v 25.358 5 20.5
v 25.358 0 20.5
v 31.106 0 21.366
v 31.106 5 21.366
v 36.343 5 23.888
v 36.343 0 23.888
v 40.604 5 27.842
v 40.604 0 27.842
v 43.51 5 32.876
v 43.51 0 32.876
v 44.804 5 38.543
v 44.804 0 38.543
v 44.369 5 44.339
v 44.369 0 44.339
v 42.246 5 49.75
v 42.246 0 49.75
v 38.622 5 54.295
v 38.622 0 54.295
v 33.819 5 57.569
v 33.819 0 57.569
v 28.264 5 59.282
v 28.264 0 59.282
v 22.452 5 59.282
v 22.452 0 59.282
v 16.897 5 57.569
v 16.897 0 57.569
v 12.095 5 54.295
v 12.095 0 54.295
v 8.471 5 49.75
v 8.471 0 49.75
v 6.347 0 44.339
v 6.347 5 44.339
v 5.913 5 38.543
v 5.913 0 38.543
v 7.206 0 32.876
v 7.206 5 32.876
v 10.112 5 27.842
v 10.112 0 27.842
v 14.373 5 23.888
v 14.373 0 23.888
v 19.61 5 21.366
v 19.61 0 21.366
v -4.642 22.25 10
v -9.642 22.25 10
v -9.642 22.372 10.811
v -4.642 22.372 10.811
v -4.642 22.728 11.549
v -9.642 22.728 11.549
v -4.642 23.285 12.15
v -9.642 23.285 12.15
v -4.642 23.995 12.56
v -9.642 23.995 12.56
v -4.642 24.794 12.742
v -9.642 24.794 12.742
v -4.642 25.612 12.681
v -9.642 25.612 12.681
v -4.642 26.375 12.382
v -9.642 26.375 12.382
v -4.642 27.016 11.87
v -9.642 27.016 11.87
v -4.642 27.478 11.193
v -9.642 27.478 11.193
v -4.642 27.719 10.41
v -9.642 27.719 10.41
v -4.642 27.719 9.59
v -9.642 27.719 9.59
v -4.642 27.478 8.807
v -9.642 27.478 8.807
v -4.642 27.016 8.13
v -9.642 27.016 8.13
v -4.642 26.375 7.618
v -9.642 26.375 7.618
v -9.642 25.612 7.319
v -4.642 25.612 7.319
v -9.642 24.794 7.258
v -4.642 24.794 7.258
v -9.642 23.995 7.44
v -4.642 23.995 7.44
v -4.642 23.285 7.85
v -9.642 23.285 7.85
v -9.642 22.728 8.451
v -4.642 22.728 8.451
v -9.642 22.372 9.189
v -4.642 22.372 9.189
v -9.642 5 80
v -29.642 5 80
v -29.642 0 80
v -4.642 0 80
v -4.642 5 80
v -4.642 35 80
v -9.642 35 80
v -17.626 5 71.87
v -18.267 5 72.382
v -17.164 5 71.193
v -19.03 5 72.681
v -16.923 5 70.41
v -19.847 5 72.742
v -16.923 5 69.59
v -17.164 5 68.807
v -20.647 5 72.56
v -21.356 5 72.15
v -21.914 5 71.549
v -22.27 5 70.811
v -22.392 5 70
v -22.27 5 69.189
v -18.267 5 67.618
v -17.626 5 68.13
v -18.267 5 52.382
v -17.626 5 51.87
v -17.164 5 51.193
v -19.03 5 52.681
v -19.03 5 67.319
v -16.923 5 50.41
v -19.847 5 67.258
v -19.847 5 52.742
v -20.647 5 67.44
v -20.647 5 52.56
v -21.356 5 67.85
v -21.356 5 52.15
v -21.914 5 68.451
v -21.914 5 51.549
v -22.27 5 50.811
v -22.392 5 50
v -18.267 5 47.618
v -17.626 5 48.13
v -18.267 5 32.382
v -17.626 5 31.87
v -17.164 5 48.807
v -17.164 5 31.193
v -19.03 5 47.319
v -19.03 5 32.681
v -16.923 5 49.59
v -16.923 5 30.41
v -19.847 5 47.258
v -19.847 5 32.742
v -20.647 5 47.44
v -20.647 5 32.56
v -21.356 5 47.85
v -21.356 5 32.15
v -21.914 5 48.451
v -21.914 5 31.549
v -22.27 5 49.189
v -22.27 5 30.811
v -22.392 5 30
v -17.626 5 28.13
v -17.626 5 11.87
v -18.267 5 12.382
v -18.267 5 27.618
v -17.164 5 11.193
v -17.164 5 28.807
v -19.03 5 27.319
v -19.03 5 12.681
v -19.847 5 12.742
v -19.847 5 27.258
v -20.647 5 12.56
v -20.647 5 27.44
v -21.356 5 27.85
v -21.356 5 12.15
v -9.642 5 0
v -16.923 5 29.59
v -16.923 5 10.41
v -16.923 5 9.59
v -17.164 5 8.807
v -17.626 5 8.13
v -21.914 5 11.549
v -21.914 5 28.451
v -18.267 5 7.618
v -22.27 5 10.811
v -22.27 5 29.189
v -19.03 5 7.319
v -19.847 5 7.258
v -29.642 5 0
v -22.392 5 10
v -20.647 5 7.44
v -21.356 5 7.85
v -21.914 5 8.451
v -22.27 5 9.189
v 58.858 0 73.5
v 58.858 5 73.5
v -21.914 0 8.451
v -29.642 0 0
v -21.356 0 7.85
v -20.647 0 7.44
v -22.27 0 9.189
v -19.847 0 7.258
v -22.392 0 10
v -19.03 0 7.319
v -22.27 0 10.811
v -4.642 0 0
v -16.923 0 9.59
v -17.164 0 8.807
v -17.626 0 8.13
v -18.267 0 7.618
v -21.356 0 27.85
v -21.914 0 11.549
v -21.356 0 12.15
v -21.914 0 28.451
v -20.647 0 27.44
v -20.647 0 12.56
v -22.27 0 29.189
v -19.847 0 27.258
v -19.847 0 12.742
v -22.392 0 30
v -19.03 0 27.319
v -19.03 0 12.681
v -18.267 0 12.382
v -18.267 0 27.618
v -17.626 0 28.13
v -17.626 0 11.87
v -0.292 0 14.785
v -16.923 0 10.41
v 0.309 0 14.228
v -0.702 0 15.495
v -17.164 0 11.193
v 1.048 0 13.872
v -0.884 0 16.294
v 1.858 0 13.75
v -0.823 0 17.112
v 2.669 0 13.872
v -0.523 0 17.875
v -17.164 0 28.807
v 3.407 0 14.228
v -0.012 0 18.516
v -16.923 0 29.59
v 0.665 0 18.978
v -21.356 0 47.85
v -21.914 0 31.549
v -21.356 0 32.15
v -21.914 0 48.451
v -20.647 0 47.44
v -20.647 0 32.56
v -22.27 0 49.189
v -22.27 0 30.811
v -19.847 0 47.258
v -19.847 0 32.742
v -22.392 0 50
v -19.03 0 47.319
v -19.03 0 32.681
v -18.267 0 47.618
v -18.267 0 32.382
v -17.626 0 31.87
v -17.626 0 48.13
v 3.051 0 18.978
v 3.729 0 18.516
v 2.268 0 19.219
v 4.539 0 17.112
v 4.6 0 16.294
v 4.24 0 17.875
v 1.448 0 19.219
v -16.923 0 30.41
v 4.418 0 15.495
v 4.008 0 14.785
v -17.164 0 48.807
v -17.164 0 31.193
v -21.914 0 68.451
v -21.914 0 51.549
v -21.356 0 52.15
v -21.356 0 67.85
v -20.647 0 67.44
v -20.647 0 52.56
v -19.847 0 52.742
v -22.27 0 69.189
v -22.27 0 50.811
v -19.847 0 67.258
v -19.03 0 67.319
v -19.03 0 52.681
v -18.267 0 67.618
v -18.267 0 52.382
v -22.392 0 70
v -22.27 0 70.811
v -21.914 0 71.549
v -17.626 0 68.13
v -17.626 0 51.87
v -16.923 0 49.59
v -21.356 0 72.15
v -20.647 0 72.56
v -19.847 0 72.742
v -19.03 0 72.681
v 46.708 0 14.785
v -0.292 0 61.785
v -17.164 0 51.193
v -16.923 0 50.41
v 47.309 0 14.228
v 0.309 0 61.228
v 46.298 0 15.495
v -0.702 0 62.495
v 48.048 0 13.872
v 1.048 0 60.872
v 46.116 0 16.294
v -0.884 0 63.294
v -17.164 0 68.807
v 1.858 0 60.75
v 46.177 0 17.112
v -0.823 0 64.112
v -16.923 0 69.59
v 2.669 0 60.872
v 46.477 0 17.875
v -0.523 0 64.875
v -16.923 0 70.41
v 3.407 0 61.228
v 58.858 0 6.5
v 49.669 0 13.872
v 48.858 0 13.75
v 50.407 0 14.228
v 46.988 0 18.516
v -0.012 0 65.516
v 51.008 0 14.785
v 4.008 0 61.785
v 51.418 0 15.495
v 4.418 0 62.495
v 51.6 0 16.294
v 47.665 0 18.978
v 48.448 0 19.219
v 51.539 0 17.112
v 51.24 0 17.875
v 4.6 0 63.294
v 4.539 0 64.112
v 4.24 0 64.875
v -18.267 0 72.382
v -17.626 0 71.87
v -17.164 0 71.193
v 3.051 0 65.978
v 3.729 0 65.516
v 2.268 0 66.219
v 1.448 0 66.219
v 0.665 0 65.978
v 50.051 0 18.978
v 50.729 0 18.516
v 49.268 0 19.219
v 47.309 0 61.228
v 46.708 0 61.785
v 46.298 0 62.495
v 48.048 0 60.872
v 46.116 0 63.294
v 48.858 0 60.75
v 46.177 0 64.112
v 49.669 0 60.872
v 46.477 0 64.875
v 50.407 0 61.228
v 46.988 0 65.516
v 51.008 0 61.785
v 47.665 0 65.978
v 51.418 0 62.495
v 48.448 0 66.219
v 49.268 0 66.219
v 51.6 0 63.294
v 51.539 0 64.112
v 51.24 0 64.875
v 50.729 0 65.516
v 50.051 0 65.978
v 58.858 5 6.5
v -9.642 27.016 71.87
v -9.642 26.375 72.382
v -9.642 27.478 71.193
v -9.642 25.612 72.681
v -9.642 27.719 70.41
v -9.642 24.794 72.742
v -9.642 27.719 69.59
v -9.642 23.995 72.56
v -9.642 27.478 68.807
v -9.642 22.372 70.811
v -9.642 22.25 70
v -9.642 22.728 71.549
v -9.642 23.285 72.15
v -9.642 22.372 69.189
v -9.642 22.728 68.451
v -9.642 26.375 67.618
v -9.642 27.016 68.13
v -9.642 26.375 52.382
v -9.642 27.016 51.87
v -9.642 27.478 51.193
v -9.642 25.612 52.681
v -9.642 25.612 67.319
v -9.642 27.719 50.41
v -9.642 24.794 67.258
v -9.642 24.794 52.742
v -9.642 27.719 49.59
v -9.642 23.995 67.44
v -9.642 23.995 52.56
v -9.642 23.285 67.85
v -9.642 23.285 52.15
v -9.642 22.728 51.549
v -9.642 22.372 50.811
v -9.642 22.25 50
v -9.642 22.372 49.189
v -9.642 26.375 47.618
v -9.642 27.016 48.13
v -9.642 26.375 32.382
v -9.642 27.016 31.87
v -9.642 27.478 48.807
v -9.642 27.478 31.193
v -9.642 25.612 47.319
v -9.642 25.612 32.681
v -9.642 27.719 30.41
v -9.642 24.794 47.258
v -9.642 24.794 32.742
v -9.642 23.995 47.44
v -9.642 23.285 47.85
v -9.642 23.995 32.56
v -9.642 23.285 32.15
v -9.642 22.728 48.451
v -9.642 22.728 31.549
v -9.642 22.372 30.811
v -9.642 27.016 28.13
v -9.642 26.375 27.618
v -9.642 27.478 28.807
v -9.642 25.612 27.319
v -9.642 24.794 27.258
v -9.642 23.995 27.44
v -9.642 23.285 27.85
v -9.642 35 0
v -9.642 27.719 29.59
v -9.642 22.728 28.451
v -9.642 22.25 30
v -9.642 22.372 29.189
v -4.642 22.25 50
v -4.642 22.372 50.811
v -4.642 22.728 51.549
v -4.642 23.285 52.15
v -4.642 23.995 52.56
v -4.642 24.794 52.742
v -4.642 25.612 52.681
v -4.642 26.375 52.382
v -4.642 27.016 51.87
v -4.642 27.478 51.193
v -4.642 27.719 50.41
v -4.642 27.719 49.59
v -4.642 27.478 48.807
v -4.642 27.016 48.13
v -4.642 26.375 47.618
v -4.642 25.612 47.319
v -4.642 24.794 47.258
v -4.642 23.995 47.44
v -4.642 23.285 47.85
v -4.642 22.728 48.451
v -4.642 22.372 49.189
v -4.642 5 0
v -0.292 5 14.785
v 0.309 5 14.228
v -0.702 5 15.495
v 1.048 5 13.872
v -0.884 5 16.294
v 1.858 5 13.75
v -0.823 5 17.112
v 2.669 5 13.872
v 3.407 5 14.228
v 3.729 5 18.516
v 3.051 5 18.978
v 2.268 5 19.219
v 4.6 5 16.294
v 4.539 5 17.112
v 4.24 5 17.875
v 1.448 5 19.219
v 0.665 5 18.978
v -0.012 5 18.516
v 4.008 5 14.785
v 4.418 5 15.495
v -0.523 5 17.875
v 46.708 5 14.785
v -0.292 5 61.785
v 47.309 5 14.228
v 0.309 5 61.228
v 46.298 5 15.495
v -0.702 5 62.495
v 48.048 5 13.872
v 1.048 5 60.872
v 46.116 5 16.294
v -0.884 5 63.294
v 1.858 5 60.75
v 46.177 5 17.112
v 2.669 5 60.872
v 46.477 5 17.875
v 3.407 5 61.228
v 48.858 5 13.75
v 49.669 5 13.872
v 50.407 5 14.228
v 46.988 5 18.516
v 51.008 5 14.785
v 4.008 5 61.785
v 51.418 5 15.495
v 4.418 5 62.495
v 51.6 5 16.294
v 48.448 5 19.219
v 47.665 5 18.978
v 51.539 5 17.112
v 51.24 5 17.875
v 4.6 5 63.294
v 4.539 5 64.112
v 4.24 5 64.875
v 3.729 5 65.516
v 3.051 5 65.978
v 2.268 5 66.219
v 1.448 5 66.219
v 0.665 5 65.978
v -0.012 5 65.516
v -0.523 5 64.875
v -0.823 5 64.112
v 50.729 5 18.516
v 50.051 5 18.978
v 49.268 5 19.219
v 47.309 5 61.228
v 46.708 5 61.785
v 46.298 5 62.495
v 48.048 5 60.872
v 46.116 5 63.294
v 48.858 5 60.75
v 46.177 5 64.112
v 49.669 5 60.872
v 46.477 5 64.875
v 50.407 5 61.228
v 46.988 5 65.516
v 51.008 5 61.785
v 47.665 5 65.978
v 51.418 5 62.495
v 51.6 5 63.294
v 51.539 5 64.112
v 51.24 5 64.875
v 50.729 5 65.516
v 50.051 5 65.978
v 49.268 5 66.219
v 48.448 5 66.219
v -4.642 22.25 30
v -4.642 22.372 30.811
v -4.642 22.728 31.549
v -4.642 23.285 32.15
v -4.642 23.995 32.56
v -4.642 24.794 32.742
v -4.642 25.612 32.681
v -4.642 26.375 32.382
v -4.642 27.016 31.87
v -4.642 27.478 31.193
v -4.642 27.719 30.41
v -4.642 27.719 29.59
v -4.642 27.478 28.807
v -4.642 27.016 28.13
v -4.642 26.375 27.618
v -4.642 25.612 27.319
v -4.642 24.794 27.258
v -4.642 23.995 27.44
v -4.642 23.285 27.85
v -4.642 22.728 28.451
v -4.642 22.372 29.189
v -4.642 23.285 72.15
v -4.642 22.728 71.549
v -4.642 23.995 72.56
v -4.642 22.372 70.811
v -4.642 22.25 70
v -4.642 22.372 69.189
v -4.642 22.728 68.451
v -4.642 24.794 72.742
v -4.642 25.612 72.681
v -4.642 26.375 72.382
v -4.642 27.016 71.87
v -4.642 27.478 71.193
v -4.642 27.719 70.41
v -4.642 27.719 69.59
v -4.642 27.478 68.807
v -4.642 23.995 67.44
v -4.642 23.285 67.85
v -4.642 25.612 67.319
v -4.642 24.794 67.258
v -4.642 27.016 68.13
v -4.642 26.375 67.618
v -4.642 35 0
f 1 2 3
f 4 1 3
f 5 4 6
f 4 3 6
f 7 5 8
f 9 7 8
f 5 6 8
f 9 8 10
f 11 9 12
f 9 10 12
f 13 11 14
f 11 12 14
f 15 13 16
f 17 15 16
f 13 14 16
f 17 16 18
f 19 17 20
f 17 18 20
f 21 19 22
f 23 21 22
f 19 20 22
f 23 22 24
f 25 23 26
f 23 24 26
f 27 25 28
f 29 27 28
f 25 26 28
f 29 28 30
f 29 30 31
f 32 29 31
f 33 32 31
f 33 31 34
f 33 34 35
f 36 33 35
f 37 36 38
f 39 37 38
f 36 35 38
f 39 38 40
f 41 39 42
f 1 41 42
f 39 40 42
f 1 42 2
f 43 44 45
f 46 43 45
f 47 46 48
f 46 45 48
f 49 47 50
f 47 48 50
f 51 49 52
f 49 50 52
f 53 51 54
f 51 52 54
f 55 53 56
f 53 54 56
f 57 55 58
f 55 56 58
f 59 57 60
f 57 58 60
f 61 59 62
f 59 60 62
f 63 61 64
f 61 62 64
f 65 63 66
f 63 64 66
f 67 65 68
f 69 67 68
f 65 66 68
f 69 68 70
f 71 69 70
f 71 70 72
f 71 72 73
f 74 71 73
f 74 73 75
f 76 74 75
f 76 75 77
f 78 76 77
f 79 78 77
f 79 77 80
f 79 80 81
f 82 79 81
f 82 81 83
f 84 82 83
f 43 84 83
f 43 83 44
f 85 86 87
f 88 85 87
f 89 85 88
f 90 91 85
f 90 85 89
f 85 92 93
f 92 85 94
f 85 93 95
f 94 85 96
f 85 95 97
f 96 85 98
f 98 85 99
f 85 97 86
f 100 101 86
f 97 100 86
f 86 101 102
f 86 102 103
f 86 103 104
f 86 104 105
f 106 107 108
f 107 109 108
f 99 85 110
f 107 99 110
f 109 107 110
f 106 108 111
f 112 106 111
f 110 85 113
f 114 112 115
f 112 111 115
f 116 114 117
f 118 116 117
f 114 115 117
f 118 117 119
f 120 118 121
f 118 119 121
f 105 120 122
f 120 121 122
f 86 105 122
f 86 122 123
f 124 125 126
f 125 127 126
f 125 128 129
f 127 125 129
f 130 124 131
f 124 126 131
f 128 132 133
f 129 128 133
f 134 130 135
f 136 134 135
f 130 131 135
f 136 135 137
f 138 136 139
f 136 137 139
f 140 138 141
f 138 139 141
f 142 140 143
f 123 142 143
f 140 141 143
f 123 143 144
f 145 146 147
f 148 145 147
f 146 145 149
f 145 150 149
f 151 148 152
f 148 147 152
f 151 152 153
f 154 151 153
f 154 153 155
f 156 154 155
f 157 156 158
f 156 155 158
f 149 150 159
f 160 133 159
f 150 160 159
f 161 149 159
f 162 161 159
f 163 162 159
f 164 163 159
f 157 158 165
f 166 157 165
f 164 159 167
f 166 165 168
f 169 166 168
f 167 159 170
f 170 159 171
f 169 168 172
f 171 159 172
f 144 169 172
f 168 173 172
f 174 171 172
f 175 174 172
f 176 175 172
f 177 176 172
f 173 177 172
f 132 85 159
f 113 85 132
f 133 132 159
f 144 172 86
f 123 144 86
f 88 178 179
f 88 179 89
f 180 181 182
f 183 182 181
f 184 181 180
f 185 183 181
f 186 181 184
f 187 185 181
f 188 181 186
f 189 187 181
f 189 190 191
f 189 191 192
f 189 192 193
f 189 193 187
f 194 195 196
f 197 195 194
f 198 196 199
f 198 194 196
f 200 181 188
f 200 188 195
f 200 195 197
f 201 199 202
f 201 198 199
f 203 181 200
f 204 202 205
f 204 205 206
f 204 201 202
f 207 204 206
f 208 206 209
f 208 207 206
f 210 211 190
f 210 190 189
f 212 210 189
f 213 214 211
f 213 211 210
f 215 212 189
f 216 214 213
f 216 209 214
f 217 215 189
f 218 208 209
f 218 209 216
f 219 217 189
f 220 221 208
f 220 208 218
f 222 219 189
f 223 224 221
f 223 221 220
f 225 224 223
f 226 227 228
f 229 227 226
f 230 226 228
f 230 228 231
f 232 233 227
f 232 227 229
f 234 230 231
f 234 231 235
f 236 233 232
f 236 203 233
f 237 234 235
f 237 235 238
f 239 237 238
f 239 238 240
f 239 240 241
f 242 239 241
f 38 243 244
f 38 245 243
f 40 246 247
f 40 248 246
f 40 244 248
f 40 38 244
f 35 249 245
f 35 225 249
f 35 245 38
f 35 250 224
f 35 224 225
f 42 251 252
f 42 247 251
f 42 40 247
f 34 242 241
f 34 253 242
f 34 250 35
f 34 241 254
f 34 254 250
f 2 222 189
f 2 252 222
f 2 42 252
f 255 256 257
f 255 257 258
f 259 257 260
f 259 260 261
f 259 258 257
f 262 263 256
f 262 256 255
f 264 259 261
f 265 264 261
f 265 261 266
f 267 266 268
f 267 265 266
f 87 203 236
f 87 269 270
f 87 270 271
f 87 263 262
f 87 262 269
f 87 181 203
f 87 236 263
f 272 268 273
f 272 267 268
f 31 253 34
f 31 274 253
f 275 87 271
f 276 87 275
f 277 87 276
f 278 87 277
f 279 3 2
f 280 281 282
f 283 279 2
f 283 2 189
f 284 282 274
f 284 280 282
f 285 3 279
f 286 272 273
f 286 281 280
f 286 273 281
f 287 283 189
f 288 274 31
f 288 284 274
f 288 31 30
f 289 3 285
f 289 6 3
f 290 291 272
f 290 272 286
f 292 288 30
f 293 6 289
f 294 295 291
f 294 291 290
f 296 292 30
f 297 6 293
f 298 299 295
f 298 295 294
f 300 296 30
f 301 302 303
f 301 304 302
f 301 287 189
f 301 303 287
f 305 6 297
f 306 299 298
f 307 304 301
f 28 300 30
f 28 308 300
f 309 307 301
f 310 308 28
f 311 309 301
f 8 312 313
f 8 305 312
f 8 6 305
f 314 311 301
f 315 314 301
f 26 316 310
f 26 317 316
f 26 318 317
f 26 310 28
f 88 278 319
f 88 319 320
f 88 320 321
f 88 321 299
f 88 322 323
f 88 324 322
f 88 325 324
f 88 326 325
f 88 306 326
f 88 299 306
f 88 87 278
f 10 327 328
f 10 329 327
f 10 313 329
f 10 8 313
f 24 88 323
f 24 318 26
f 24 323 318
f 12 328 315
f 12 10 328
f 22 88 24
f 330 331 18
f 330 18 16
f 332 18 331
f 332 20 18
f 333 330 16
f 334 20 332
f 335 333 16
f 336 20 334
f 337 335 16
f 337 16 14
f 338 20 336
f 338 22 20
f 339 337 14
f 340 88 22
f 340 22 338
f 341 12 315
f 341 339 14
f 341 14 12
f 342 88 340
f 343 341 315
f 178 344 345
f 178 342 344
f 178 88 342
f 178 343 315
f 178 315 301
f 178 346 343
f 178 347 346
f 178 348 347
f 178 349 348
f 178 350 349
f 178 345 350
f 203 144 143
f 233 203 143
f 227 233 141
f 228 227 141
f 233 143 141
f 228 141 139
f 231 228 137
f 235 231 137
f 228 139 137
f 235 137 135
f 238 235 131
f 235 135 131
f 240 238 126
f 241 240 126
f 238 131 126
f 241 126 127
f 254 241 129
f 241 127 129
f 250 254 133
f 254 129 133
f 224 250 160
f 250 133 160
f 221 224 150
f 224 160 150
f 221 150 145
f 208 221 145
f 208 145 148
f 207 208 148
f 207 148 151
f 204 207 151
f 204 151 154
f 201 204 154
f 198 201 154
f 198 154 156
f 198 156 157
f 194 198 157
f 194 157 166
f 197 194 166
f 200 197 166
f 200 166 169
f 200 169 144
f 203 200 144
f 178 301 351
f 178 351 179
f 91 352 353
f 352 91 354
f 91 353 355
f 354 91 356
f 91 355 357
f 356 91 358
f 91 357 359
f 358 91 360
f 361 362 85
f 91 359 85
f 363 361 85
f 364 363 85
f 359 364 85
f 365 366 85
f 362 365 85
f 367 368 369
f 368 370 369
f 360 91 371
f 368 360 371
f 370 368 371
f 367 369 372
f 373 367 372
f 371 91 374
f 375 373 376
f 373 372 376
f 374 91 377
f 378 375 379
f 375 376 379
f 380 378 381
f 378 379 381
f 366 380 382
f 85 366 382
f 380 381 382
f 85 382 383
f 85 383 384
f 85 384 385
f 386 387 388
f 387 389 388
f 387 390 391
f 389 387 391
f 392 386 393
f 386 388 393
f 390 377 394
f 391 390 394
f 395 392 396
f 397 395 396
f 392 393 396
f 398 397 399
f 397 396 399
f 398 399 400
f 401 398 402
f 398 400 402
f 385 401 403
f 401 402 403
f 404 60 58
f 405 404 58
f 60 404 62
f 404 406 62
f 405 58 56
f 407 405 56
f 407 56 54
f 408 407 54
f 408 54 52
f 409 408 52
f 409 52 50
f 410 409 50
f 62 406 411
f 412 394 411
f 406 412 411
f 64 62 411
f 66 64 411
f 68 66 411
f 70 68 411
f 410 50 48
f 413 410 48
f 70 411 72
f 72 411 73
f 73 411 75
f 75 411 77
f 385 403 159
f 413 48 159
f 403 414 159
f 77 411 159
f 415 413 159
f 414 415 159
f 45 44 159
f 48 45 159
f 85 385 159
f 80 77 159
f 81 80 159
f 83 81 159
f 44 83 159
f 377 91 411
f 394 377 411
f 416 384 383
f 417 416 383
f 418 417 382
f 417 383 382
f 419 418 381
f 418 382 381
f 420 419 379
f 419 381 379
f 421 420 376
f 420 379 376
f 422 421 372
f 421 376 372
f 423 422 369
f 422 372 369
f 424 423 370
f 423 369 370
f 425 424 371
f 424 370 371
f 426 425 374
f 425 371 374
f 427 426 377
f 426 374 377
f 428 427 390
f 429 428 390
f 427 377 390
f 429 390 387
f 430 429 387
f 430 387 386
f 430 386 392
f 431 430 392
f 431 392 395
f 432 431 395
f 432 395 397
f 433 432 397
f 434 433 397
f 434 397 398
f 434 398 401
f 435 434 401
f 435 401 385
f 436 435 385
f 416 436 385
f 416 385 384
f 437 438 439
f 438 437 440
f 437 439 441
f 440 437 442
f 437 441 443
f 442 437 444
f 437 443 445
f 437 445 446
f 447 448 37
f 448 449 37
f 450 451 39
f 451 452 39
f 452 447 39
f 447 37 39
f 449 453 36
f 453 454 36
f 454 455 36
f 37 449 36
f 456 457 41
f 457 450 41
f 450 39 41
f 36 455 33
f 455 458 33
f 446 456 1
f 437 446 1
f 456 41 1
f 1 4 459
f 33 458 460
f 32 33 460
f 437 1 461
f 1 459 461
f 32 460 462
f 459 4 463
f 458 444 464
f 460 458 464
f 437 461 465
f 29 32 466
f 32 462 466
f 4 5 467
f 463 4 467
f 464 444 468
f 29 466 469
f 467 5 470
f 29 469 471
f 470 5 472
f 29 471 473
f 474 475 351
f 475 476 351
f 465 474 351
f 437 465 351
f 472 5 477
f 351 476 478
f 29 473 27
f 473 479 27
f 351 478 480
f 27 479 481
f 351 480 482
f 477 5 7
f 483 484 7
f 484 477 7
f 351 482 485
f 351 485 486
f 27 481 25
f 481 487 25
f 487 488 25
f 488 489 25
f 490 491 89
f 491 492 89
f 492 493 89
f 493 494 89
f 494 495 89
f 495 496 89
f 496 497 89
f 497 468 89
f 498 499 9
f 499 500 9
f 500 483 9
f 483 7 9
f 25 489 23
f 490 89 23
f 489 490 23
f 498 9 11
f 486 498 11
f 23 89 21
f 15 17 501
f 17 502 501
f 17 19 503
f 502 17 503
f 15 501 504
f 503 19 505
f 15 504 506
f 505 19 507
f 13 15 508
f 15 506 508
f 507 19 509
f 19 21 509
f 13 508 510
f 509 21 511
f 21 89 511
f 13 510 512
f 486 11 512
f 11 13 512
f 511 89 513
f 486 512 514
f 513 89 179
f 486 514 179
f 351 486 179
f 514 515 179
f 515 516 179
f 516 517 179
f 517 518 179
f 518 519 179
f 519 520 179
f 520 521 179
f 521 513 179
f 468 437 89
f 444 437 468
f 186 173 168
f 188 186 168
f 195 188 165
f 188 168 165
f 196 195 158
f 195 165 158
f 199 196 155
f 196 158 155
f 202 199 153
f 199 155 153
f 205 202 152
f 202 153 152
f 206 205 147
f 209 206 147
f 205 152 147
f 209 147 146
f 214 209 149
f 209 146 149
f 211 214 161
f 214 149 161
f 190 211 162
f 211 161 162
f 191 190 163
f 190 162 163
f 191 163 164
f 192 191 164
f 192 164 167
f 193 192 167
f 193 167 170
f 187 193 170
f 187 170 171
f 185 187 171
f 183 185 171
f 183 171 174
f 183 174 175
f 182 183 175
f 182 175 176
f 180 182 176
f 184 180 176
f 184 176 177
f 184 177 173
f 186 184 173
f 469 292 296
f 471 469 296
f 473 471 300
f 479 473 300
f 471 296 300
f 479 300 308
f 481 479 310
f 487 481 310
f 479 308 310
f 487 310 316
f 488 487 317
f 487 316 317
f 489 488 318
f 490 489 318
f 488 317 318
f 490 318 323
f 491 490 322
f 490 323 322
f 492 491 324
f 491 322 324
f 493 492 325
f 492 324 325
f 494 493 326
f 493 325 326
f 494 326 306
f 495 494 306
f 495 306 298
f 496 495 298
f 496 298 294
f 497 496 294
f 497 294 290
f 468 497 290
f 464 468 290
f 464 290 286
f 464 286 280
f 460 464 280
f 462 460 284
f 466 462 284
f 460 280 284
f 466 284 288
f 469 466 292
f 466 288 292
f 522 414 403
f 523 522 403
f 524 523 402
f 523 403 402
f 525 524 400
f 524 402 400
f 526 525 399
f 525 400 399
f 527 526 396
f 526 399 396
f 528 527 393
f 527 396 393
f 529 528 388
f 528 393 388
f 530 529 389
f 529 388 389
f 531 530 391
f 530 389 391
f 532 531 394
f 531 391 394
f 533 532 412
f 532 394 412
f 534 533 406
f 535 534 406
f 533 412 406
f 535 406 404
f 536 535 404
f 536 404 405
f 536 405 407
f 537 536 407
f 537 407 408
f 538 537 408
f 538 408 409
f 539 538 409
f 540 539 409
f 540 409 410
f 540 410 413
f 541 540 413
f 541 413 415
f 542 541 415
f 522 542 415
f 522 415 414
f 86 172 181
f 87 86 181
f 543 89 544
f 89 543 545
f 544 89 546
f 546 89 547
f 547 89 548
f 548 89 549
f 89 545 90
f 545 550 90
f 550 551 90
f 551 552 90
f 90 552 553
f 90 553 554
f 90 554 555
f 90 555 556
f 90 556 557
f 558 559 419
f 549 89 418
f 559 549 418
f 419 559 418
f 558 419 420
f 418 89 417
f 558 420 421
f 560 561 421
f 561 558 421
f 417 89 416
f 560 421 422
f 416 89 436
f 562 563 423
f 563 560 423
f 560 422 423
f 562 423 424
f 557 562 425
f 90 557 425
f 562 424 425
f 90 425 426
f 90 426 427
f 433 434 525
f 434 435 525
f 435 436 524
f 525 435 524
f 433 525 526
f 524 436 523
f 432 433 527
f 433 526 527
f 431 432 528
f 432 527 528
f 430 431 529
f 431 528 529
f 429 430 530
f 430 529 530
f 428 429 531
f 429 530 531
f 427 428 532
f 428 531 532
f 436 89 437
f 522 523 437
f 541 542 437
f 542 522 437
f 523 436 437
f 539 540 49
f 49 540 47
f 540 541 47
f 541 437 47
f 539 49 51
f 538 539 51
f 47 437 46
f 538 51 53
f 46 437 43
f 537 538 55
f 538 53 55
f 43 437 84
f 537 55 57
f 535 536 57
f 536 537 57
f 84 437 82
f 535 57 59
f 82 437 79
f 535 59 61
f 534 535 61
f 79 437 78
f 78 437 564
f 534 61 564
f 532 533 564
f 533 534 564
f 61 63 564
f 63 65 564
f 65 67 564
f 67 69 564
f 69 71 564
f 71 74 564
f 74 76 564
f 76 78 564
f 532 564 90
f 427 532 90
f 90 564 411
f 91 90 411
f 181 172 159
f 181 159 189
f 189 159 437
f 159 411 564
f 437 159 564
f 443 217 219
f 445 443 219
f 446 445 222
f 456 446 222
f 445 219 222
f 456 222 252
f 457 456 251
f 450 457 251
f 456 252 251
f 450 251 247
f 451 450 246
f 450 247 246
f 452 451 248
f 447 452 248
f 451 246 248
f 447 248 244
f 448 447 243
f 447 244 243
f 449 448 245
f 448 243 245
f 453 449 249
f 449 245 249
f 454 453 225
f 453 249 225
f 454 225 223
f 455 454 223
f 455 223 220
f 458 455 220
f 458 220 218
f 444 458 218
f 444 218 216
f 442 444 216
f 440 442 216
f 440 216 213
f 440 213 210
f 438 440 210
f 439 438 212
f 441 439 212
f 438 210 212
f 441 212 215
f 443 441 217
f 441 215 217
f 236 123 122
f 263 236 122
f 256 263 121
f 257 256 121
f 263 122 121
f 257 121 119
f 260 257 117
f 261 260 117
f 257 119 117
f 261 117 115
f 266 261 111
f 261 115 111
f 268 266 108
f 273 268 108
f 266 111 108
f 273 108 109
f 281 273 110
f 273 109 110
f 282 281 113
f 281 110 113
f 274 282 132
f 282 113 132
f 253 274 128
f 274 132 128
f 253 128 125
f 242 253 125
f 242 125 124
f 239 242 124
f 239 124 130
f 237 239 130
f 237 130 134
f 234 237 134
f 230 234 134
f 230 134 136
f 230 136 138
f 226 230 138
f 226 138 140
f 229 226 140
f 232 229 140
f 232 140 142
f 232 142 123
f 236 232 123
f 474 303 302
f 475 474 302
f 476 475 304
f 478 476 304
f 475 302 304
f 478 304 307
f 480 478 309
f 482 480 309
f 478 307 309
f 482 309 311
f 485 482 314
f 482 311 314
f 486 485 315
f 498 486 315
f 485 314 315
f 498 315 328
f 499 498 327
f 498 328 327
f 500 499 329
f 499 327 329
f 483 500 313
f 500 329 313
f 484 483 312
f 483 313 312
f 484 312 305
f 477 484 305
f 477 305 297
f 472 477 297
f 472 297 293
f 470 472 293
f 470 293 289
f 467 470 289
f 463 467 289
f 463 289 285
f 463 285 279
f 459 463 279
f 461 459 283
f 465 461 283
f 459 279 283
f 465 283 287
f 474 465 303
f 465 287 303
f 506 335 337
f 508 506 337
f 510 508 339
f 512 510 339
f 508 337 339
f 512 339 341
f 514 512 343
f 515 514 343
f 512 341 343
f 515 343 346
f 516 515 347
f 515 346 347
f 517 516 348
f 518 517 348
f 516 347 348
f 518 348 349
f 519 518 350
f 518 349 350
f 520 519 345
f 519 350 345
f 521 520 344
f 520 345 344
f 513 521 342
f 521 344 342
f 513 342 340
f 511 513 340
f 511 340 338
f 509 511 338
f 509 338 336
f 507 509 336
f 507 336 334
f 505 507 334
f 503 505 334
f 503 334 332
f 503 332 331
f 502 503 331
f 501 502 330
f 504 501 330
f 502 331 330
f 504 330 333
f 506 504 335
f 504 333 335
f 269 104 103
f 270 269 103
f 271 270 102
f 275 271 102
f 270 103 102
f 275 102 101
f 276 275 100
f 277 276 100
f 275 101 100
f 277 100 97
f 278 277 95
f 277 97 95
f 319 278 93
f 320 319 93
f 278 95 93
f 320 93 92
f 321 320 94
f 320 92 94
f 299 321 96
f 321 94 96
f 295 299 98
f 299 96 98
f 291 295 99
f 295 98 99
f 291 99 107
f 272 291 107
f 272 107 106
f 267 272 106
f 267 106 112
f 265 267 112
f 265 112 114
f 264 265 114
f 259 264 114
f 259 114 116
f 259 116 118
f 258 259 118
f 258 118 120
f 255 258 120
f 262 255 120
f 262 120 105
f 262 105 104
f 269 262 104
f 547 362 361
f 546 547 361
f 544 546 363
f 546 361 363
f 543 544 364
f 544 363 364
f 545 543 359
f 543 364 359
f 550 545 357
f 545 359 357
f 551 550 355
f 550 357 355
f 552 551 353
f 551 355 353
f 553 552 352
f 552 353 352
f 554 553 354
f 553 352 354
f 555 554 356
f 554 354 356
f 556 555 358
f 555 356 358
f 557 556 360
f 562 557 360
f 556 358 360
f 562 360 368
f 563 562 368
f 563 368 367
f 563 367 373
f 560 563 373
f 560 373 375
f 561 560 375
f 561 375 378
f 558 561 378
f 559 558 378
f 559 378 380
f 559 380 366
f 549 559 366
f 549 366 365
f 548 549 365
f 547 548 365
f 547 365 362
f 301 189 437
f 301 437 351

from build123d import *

# Parameters (mm, degrees)
BOSS_EXTRU_1_DEPTH      = 80
ENL_V_MAT_EXTRU_1_REACH = 91.582
ESQUISSE2_R             = 2.75
ENL_V_MAT_EXTRU_2_REACH = 92.436
ESQUISSE3_R             = 2.75
ESQUISSE5_R             = 2.75
ESQUISSE5_R_2           = 19.5
BOSS_EXTRU_2_DEPTH      = 5


with BuildPart() as part:
    # Esquisse1 → Boss.-Extru.1 (new body)
    with BuildSketch(Plane.XY):
        Polygon((-4.641855204, 0), (-4.641855204, 35), (-9.641855204, 35), (-9.641855204, 5), (-29.641855204, 5), (-29.641855204, 0), align=None)
    extrude(amount=BOSS_EXTRU_1_DEPTH)

    # Esquisse2 → Enlèv. mat.-Extru.1 (cut, up to next)
    with BuildSketch(Plane.ZY.offset(9.641855204), mode=Mode.PRIVATE) as enl_v_mat_extru_1_sk1:
        with Locations(Location((10, 25, 0), (0, 0, 270))):
            Circle(ESQUISSE2_R)
    enl_v_mat_extru_1_tool1 = extrude(enl_v_mat_extru_1_sk1.sketch, amount=-ENL_V_MAT_EXTRU_1_REACH, mode=Mode.PRIVATE) & part.part
    # Esquisse2 → Enlèv. mat.-Extru.1 (cut, up to next)
    with BuildSketch(Plane.ZY.offset(9.641855204), mode=Mode.PRIVATE) as enl_v_mat_extru_1_sk2:
        with Locations(Location((50, 25, 0), (0, 0, 270))):
            Circle(ESQUISSE2_R)
    enl_v_mat_extru_1_tool2 = extrude(enl_v_mat_extru_1_sk2.sketch, amount=-ENL_V_MAT_EXTRU_1_REACH, mode=Mode.PRIVATE) & part.part
    # Esquisse2 → Enlèv. mat.-Extru.1 (cut, up to next)
    with BuildSketch(Plane.ZY.offset(9.641855204), mode=Mode.PRIVATE) as enl_v_mat_extru_1_sk3:
        with Locations(Location((70, 25, 0), (0, 0, 270))):
            Circle(ESQUISSE2_R)
    enl_v_mat_extru_1_tool3 = extrude(enl_v_mat_extru_1_sk3.sketch, amount=-ENL_V_MAT_EXTRU_1_REACH, mode=Mode.PRIVATE) & part.part
    # Esquisse2 → Enlèv. mat.-Extru.1 (cut, up to next)
    with BuildSketch(Plane.ZY.offset(9.641855204), mode=Mode.PRIVATE) as enl_v_mat_extru_1_sk4:
        with Locations(Location((30, 25, 0), (0, 0, 270))):
            Circle(ESQUISSE2_R)
    enl_v_mat_extru_1_tool4 = extrude(enl_v_mat_extru_1_sk4.sketch, amount=-ENL_V_MAT_EXTRU_1_REACH, mode=Mode.PRIVATE) & part.part
    add(enl_v_mat_extru_1_tool1.solids().sort_by_distance((-9.641855, 25, 10))[0], mode=Mode.SUBTRACT)
    add(enl_v_mat_extru_1_tool2.solids().sort_by_distance((-9.641855, 25, 50))[0], mode=Mode.SUBTRACT)
    add(enl_v_mat_extru_1_tool3.solids().sort_by_distance((-9.641855, 25, 70))[0], mode=Mode.SUBTRACT)
    add(enl_v_mat_extru_1_tool4.solids().sort_by_distance((-9.641855, 25, 30))[0], mode=Mode.SUBTRACT)

    # Esquisse3 → Enlèv. mat.-Extru.2 (cut, up to next)
    with BuildSketch(Plane(origin=(0, 5, 0), x_dir=(1, 0, 0), z_dir=(0, 1, 0)), mode=Mode.PRIVATE) as enl_v_mat_extru_2_sk1:
        with Locations(Location((-19.641855204, -10, 0), (0, 0, 180))):
            Circle(ESQUISSE3_R)
    enl_v_mat_extru_2_tool1 = extrude(enl_v_mat_extru_2_sk1.sketch, amount=-ENL_V_MAT_EXTRU_2_REACH, mode=Mode.PRIVATE) & part.part
    # Esquisse3 → Enlèv. mat.-Extru.2 (cut, up to next)
    with BuildSketch(Plane(origin=(0, 5, 0), x_dir=(1, 0, 0), z_dir=(0, 1, 0)), mode=Mode.PRIVATE) as enl_v_mat_extru_2_sk2:
        with Locations(Location((-19.641855204, -30, 0), (0, 0, 180))):
            Circle(ESQUISSE3_R)
    enl_v_mat_extru_2_tool2 = extrude(enl_v_mat_extru_2_sk2.sketch, amount=-ENL_V_MAT_EXTRU_2_REACH, mode=Mode.PRIVATE) & part.part
    # Esquisse3 → Enlèv. mat.-Extru.2 (cut, up to next)
    with BuildSketch(Plane(origin=(0, 5, 0), x_dir=(1, 0, 0), z_dir=(0, 1, 0)), mode=Mode.PRIVATE) as enl_v_mat_extru_2_sk3:
        with Locations(Location((-19.641855204, -50, 0), (0, 0, 180))):
            Circle(ESQUISSE3_R)
    enl_v_mat_extru_2_tool3 = extrude(enl_v_mat_extru_2_sk3.sketch, amount=-ENL_V_MAT_EXTRU_2_REACH, mode=Mode.PRIVATE) & part.part
    # Esquisse3 → Enlèv. mat.-Extru.2 (cut, up to next)
    with BuildSketch(Plane(origin=(0, 5, 0), x_dir=(1, 0, 0), z_dir=(0, 1, 0)), mode=Mode.PRIVATE) as enl_v_mat_extru_2_sk4:
        with Locations(Location((-19.641855204, -70, 0), (0, 0, 180))):
            Circle(ESQUISSE3_R)
    enl_v_mat_extru_2_tool4 = extrude(enl_v_mat_extru_2_sk4.sketch, amount=-ENL_V_MAT_EXTRU_2_REACH, mode=Mode.PRIVATE) & part.part
    add(enl_v_mat_extru_2_tool1.solids().sort_by_distance((-19.641855, 5, 10))[0], mode=Mode.SUBTRACT)
    add(enl_v_mat_extru_2_tool2.solids().sort_by_distance((-19.641855, 5, 30))[0], mode=Mode.SUBTRACT)
    add(enl_v_mat_extru_2_tool3.solids().sort_by_distance((-19.641855, 5, 50))[0], mode=Mode.SUBTRACT)
    add(enl_v_mat_extru_2_tool4.solids().sort_by_distance((-19.641855, 5, 70))[0], mode=Mode.SUBTRACT)

    # Esquisse5 → Boss.-Extru.2 (add)
    with BuildSketch(Plane.XZ):
        Polygon((-4.641855204, 0), (58.858144796, 6.5), (58.858144796, 73.5), (-4.641855204, 80), align=None)
        with Locations(Location((1.858144796, 16.5, 0), (0, 0, 270))):
            Circle(ESQUISSE5_R, mode=Mode.SUBTRACT)
        with Locations(Location((1.858144796, 63.5, 0), (0, 0, 270))):
            Circle(ESQUISSE5_R, mode=Mode.SUBTRACT)
        with Locations(Location((48.858144796, 63.5, 0), (0, 0, 270))):
            Circle(ESQUISSE5_R, mode=Mode.SUBTRACT)
        with Locations(Location((48.858144796, 16.5, 0), (0, 0, 270))):
            Circle(ESQUISSE5_R, mode=Mode.SUBTRACT)
        with Locations(Location((25.358144796, 40, 0), (0, 0, 270))):
            Circle(ESQUISSE5_R_2, mode=Mode.SUBTRACT)
    extrude(amount=-BOSS_EXTRU_2_DEPTH)


solid = part.part
